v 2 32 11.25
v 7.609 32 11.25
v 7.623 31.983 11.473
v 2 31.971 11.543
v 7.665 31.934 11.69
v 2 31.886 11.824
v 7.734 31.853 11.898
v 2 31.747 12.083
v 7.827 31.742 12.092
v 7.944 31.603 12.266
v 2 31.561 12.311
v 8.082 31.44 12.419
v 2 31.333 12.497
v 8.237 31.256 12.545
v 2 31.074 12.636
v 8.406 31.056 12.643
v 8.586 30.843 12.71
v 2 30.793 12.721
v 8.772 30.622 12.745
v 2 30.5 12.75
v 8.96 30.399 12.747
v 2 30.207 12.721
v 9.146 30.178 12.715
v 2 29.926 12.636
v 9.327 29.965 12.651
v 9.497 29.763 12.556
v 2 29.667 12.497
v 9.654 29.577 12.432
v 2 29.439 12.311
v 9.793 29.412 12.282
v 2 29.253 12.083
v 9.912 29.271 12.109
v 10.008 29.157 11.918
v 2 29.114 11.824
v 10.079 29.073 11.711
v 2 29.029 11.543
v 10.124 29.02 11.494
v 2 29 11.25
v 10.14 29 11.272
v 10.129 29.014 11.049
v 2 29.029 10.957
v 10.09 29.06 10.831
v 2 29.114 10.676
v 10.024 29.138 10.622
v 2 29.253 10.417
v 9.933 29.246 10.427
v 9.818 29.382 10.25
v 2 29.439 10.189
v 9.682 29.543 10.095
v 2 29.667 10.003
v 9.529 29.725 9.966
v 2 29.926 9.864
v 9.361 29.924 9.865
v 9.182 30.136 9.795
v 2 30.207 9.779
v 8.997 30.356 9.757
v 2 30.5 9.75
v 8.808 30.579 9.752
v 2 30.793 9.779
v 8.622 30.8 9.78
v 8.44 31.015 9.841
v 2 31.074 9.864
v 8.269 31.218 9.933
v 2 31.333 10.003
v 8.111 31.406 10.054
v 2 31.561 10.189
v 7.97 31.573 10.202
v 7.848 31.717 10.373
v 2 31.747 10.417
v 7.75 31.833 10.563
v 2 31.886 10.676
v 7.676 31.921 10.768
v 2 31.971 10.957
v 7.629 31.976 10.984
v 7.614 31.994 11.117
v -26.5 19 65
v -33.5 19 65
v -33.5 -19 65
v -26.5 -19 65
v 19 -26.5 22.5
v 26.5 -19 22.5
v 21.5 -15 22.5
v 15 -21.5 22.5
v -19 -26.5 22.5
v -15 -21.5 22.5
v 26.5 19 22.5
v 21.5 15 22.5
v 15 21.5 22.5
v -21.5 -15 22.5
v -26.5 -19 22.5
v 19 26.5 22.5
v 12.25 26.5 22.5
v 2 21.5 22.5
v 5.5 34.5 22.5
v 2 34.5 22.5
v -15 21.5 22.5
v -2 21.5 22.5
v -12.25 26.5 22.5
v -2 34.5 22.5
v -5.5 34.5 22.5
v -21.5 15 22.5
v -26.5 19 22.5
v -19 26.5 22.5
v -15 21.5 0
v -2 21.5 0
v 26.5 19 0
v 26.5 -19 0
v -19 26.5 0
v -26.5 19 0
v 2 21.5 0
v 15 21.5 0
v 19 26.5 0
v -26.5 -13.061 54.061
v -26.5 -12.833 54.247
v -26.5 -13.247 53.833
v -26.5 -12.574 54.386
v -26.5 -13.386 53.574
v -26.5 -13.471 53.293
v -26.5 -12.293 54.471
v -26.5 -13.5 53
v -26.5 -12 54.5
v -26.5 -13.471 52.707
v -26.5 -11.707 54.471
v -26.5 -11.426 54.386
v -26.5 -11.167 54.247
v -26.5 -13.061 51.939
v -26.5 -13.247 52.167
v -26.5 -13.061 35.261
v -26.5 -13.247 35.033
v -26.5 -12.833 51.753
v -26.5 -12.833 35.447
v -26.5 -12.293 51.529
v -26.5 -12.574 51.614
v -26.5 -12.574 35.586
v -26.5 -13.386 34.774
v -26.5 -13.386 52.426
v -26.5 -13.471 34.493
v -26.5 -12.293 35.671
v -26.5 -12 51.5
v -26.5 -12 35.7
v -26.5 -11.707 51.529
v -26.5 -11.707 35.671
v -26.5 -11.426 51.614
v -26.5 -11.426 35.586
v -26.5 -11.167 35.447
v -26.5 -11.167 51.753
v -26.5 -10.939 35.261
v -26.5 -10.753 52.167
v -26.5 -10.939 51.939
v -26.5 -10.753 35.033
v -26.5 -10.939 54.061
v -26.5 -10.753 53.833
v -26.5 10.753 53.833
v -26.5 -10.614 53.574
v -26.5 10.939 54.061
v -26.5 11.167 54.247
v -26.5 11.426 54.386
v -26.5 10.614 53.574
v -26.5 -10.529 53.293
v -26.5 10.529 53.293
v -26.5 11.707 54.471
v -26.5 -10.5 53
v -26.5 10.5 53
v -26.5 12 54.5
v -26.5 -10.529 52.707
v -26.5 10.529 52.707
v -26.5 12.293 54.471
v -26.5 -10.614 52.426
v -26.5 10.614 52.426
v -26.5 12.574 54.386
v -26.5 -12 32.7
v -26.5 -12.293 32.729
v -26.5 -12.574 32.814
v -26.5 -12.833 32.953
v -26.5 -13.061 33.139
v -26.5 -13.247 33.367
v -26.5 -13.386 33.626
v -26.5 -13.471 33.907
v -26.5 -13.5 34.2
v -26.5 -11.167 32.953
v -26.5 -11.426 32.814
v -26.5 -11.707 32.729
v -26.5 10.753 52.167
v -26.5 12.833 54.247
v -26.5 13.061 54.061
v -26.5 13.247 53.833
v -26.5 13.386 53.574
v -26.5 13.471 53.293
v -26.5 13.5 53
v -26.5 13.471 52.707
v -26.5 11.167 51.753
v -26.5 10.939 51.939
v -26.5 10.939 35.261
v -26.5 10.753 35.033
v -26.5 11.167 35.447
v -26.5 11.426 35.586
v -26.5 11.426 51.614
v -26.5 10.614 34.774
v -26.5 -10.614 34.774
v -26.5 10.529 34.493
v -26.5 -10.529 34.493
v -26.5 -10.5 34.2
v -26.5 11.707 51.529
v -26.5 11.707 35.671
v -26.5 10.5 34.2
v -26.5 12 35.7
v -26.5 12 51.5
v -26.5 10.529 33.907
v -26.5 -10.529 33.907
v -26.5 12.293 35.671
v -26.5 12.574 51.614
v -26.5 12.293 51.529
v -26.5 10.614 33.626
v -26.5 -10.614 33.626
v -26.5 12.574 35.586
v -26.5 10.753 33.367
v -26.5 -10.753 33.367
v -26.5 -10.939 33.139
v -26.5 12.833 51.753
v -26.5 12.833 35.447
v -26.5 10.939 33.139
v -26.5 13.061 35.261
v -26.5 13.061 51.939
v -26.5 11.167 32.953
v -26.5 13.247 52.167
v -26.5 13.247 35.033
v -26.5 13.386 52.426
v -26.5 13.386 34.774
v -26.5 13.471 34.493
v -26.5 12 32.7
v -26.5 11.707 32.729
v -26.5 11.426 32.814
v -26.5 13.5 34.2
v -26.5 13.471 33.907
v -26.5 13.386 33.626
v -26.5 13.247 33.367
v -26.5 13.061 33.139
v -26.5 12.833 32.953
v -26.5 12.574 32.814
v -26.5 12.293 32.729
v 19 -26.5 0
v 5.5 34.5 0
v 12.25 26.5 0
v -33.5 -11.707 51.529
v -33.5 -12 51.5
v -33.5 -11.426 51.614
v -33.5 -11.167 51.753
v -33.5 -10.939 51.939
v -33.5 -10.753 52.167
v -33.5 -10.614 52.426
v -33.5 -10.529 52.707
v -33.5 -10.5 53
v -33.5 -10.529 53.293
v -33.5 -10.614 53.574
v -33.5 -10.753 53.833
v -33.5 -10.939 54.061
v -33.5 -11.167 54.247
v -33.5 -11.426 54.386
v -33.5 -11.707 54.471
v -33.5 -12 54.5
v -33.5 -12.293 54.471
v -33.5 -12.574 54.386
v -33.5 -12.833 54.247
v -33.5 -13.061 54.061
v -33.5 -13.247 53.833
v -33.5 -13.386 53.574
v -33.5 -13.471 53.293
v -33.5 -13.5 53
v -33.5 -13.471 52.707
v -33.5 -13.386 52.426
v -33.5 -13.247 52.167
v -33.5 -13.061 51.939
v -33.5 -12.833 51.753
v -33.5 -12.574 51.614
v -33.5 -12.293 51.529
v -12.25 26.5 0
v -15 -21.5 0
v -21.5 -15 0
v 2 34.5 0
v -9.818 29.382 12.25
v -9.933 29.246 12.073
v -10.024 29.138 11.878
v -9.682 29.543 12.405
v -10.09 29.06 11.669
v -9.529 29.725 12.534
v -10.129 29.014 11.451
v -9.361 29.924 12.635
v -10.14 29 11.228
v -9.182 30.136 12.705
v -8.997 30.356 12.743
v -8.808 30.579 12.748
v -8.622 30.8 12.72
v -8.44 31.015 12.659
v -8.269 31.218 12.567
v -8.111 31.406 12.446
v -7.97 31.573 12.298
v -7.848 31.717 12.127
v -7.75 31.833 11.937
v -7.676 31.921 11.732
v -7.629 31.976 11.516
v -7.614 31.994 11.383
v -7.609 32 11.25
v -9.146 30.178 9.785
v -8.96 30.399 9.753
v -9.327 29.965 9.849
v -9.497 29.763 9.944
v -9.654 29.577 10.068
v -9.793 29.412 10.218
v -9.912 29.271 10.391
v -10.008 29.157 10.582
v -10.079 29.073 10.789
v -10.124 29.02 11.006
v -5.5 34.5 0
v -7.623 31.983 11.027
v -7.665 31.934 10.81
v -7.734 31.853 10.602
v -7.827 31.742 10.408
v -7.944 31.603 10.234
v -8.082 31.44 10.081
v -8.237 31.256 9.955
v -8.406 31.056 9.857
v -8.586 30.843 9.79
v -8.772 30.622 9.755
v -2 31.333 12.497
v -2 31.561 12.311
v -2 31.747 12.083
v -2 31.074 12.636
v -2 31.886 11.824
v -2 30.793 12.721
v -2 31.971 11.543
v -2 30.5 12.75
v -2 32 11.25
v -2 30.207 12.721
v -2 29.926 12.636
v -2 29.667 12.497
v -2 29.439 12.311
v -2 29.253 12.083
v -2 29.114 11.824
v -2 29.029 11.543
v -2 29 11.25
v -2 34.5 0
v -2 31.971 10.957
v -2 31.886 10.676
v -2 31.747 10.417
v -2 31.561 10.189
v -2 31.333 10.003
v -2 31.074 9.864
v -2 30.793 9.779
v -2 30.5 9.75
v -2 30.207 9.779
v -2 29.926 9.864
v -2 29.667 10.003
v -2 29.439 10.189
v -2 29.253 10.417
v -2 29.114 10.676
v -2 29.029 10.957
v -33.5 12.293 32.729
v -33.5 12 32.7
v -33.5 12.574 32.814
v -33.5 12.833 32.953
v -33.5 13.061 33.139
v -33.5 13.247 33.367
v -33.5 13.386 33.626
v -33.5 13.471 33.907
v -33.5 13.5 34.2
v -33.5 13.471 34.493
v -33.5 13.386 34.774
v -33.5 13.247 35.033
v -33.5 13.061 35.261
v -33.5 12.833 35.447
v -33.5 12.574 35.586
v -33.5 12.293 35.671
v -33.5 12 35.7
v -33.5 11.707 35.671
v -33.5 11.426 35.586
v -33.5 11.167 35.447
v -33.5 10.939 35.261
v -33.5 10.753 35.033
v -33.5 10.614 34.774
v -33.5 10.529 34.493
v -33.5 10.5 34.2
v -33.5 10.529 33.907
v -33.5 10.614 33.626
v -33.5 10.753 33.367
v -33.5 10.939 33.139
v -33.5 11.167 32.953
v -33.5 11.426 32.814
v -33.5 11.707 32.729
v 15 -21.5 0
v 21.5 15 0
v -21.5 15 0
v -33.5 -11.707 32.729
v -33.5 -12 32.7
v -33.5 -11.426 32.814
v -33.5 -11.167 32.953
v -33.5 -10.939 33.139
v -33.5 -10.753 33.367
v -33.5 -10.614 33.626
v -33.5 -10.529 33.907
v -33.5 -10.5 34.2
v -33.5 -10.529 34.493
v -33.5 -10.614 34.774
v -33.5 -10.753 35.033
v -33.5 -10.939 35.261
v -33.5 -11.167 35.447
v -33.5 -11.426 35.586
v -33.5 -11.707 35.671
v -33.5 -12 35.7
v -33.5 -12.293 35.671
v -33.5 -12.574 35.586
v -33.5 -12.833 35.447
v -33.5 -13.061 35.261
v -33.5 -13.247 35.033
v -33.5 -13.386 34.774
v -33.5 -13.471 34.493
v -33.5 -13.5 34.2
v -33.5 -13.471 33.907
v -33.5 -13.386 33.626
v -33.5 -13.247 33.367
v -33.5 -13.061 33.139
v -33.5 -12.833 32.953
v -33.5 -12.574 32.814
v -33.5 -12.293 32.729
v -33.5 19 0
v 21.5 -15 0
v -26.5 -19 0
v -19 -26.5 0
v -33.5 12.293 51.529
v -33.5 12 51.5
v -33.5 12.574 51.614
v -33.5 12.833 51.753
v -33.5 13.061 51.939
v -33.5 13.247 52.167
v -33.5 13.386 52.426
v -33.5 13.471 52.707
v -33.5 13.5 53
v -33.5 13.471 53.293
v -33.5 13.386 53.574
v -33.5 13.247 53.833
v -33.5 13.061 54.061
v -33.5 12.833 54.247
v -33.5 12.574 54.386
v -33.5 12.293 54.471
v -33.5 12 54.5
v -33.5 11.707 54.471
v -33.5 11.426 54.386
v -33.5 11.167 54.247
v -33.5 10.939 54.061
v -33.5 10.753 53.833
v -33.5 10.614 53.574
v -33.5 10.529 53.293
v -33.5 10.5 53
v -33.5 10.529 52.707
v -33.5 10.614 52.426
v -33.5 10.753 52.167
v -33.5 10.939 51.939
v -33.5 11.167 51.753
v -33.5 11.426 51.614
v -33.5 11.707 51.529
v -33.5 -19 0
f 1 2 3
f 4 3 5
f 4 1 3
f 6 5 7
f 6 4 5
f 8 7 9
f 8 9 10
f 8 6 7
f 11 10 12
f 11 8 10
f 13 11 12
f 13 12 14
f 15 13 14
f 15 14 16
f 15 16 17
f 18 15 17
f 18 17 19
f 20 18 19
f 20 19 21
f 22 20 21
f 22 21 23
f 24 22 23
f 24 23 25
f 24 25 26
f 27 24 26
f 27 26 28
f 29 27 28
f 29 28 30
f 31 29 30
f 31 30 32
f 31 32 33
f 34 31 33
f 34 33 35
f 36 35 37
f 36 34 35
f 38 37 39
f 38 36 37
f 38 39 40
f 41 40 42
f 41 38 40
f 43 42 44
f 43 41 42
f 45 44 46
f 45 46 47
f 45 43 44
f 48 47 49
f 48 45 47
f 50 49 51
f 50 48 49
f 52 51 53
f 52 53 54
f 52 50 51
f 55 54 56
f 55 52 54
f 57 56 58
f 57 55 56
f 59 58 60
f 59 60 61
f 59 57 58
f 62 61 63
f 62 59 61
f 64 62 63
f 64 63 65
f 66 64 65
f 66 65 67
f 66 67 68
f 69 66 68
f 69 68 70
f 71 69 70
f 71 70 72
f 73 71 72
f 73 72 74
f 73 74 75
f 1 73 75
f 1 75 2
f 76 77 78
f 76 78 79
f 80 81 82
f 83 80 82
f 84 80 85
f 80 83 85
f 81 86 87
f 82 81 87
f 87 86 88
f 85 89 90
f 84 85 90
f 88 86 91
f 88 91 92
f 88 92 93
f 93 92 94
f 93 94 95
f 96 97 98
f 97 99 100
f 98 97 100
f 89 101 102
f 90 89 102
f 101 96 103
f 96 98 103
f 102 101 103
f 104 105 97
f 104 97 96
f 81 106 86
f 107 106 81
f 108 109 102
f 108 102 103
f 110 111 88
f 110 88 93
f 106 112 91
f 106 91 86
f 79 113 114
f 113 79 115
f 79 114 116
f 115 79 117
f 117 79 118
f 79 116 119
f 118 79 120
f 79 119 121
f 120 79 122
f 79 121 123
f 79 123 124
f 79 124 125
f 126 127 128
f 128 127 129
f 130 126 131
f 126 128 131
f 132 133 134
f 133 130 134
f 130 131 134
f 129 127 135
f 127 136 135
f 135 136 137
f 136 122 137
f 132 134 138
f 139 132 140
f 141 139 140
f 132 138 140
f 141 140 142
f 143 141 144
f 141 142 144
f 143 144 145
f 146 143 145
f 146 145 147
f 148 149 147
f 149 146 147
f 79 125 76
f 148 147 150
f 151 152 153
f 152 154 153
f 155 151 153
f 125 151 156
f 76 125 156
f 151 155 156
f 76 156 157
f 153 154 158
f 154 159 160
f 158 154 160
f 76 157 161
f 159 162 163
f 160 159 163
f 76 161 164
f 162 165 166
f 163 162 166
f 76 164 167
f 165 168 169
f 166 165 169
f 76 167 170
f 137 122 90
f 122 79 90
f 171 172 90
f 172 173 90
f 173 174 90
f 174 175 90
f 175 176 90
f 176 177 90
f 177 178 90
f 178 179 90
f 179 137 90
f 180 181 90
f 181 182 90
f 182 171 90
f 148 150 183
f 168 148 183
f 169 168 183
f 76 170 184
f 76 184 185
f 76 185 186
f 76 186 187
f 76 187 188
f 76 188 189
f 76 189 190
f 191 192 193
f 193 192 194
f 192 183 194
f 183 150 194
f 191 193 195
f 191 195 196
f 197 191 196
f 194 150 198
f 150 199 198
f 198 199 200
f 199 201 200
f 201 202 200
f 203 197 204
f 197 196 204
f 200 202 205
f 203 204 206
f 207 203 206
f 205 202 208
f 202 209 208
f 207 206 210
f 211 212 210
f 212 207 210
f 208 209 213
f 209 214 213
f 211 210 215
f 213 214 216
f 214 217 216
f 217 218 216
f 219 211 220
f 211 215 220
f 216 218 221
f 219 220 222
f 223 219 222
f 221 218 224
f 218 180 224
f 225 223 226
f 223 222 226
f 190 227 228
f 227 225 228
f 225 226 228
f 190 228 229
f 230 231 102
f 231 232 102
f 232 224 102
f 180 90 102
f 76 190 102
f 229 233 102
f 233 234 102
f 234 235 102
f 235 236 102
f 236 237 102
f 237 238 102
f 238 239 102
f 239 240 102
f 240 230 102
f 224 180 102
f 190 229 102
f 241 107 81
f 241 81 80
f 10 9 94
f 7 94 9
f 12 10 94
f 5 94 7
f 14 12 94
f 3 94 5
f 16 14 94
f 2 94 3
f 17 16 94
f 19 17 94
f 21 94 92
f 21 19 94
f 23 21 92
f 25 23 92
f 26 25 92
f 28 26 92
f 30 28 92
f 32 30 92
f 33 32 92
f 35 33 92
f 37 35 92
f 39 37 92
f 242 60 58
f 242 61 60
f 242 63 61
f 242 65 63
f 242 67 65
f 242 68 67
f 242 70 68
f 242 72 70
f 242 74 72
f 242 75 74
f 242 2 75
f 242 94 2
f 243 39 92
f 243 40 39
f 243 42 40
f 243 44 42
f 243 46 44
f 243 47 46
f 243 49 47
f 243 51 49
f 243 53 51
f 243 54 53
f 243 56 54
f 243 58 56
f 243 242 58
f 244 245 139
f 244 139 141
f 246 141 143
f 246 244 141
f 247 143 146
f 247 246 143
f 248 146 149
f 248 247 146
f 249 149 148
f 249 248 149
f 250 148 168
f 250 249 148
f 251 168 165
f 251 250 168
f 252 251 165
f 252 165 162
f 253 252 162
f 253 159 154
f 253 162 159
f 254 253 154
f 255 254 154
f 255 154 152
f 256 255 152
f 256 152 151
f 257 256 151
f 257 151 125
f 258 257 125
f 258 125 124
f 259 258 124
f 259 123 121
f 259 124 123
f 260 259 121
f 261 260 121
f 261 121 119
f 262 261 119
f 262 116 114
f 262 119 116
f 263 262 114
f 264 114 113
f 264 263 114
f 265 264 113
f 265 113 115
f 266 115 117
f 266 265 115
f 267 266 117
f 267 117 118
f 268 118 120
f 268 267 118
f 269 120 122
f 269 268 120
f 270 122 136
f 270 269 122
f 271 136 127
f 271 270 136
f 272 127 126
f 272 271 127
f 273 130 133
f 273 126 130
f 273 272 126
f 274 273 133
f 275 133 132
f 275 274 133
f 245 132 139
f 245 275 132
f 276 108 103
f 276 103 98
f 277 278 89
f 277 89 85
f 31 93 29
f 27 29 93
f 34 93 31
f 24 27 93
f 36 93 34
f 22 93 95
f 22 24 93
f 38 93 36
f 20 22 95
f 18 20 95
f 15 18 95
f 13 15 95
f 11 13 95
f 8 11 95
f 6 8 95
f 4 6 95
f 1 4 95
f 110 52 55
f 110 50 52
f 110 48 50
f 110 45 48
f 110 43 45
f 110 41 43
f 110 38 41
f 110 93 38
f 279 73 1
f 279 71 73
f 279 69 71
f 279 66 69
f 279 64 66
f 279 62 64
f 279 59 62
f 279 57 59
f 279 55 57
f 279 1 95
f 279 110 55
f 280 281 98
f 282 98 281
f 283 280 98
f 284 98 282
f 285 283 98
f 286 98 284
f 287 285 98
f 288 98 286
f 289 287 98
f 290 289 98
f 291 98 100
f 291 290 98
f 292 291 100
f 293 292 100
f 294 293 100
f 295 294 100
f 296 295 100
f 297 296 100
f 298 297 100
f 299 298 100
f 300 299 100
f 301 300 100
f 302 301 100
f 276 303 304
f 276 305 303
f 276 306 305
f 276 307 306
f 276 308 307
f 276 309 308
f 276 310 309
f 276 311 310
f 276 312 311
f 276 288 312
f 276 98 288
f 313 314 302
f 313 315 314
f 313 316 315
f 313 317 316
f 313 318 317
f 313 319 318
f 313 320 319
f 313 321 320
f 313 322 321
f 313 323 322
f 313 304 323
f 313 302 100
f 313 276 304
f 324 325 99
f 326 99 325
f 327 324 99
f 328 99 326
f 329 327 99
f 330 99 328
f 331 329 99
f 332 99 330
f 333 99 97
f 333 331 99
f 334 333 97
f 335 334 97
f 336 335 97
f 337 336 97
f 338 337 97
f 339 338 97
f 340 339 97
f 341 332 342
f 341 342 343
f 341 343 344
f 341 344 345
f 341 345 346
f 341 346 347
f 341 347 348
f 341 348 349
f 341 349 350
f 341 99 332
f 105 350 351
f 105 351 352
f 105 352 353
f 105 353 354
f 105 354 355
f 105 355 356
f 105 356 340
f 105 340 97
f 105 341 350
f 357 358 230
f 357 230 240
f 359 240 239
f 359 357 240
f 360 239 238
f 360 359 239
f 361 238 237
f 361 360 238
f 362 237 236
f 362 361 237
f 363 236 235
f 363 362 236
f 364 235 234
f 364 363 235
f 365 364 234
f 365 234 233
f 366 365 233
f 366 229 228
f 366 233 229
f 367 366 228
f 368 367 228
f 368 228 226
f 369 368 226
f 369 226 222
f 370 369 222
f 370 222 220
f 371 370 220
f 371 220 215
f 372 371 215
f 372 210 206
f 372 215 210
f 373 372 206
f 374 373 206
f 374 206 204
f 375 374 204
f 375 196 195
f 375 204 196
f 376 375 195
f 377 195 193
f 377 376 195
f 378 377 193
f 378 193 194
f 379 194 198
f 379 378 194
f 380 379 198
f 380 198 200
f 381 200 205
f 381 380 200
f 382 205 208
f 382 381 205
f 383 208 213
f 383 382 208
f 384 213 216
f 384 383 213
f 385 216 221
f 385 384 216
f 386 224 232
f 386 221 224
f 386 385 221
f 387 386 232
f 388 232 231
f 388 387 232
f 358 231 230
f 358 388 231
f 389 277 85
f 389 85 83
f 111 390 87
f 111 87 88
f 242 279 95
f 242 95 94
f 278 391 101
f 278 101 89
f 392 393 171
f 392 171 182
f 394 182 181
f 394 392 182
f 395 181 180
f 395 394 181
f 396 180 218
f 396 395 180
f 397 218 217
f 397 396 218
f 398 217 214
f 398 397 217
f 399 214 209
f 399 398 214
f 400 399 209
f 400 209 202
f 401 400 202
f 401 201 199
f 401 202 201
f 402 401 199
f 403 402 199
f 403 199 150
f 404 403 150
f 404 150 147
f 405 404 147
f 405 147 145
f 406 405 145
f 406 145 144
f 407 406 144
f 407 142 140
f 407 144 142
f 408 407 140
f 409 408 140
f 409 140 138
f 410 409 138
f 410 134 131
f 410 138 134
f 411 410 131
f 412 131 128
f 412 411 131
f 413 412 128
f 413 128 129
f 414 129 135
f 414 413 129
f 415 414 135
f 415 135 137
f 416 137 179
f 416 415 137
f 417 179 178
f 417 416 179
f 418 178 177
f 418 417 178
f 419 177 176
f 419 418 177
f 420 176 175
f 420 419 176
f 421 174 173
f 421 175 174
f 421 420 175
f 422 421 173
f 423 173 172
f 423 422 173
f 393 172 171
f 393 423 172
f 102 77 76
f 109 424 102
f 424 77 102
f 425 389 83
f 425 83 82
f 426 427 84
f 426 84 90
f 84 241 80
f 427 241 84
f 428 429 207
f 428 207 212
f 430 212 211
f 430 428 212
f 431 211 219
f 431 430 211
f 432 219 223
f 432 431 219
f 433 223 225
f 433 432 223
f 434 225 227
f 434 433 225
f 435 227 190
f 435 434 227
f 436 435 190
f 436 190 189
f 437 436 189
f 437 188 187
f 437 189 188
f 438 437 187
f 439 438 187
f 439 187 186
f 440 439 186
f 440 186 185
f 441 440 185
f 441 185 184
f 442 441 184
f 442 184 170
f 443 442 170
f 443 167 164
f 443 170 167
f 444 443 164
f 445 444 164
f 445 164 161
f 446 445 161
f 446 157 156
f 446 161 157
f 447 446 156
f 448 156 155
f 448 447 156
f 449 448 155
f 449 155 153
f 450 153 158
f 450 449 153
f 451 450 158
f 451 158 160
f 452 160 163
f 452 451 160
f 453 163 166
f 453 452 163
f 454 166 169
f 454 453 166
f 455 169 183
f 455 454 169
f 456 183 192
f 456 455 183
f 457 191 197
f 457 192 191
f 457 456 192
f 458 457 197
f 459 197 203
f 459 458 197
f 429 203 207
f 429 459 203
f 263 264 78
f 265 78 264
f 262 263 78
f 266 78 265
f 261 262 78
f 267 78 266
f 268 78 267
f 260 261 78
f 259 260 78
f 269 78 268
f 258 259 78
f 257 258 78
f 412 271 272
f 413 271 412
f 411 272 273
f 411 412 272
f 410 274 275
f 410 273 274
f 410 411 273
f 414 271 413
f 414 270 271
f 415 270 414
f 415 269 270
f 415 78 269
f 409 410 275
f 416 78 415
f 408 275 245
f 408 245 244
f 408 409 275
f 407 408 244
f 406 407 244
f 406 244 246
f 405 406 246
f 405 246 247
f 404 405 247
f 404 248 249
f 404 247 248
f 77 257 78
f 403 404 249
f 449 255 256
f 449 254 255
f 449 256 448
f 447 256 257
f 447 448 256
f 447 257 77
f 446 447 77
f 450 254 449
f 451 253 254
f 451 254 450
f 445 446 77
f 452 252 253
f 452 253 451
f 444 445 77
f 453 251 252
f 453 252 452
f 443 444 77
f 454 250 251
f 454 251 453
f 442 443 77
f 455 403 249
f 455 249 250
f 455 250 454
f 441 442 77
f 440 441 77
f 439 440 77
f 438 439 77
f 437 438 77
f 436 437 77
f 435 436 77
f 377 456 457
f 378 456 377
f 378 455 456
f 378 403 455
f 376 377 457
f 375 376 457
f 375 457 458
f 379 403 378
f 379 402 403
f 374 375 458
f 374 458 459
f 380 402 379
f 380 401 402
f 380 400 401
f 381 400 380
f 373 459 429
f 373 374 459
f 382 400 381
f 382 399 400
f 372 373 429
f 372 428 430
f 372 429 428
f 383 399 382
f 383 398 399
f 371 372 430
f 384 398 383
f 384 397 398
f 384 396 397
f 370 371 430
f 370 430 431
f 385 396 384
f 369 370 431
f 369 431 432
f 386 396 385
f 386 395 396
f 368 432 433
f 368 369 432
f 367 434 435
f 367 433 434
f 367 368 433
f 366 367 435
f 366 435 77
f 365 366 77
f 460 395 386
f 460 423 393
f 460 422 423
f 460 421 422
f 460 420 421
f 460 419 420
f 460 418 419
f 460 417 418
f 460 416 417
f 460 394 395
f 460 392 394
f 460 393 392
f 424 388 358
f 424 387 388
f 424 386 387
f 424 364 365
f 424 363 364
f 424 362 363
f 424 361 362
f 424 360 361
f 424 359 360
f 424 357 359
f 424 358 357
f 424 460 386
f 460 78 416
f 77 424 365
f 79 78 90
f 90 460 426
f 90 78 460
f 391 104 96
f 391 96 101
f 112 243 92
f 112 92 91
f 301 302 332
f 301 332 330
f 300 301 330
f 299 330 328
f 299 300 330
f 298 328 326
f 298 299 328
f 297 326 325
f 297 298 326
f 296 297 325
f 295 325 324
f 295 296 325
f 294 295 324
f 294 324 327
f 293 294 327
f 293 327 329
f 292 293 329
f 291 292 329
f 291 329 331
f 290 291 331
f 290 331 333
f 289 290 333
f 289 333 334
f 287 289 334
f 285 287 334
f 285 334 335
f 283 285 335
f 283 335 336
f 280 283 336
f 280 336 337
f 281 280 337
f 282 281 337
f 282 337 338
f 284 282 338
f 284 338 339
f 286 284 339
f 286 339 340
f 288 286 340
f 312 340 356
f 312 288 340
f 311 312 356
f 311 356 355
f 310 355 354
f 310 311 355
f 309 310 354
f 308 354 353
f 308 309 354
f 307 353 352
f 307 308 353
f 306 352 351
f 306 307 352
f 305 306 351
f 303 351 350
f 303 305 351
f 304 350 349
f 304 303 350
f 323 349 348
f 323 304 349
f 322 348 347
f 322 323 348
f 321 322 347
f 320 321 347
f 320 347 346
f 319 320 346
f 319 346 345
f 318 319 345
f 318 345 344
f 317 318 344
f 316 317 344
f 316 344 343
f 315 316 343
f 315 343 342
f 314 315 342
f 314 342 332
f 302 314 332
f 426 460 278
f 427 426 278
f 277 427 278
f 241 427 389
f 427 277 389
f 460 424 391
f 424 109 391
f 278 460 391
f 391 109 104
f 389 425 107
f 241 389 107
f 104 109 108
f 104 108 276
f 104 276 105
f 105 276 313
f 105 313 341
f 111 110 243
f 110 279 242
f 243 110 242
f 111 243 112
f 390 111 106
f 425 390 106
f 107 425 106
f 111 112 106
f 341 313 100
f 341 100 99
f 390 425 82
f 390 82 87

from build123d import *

# Parameters (mm, degrees)
SALIENTE_EXTRUIR1_DEPTH    = 22.5
CROQUIS2_W                 = 7
CROQUIS2_H                 = 38
SALIENTE_EXTRUIR2_DEPTH    = 65
CORTAR_EXTRUIR1_DEPTH      = 81.854808144
CORTAR_EXTRUIR1_DEPTH_BACK = 81.854808144
CROQUIS3_R                 = 1.5


with BuildPart() as part:
    # Croquis1 → Saliente-Extruir1 (new body)
    with BuildSketch(Plane.XY):
        Polygon((-15, 21.5), (-21.5, 15), (-21.5, -15), (-15, -21.5), (15, -21.5), (21.5, -15), (21.5, 15), (15, 21.5), (2, 21.5), (2, 34.5), (5.5, 34.5), (12.25, 26.5), (19, 26.5), (26.5, 19), (26.5, -19), (19, -26.5), (-19, -26.5), (-26.5, -19), (-26.5, 19), (-19, 26.5), (-12.25, 26.5), (-5.5, 34.5), (-2, 34.5), (-2, 21.5), align=None)
    extrude(amount=SALIENTE_EXTRUIR1_DEPTH)

    # Croquis2 → Saliente-Extruir2 (add)
    with BuildSketch(Plane.XY):
        with Locations((-30, 0)):
            Rectangle(CROQUIS2_W, CROQUIS2_H)
    extrude(amount=SALIENTE_EXTRUIR2_DEPTH)

    # Croquis3 → Cortar-Extruir1 (cut, two sides: drawn at the far end of the back side and taken through both)
    with BuildSketch(Plane(origin=(0, 0, 0), x_dir=(0, 0, -1), z_dir=(1, 0, 0)).offset(-CORTAR_EXTRUIR1_DEPTH_BACK)):
        with Locations(Location((-11.25, 30.5, 0), (0, 0, 90))):
            Circle(CROQUIS3_R)
        with Locations((-53, 12)):
            Circle(CROQUIS3_R)
        with Locations((-34.2, 12)):
            Circle(CROQUIS3_R)
        with Locations((-34.2, -12)):
            Circle(CROQUIS3_R)
        with Locations((-53, -12)):
            Circle(CROQUIS3_R)
    extrude(amount=CORTAR_EXTRUIR1_DEPTH + CORTAR_EXTRUIR1_DEPTH_BACK, mode=Mode.SUBTRACT)


solid = part.part
